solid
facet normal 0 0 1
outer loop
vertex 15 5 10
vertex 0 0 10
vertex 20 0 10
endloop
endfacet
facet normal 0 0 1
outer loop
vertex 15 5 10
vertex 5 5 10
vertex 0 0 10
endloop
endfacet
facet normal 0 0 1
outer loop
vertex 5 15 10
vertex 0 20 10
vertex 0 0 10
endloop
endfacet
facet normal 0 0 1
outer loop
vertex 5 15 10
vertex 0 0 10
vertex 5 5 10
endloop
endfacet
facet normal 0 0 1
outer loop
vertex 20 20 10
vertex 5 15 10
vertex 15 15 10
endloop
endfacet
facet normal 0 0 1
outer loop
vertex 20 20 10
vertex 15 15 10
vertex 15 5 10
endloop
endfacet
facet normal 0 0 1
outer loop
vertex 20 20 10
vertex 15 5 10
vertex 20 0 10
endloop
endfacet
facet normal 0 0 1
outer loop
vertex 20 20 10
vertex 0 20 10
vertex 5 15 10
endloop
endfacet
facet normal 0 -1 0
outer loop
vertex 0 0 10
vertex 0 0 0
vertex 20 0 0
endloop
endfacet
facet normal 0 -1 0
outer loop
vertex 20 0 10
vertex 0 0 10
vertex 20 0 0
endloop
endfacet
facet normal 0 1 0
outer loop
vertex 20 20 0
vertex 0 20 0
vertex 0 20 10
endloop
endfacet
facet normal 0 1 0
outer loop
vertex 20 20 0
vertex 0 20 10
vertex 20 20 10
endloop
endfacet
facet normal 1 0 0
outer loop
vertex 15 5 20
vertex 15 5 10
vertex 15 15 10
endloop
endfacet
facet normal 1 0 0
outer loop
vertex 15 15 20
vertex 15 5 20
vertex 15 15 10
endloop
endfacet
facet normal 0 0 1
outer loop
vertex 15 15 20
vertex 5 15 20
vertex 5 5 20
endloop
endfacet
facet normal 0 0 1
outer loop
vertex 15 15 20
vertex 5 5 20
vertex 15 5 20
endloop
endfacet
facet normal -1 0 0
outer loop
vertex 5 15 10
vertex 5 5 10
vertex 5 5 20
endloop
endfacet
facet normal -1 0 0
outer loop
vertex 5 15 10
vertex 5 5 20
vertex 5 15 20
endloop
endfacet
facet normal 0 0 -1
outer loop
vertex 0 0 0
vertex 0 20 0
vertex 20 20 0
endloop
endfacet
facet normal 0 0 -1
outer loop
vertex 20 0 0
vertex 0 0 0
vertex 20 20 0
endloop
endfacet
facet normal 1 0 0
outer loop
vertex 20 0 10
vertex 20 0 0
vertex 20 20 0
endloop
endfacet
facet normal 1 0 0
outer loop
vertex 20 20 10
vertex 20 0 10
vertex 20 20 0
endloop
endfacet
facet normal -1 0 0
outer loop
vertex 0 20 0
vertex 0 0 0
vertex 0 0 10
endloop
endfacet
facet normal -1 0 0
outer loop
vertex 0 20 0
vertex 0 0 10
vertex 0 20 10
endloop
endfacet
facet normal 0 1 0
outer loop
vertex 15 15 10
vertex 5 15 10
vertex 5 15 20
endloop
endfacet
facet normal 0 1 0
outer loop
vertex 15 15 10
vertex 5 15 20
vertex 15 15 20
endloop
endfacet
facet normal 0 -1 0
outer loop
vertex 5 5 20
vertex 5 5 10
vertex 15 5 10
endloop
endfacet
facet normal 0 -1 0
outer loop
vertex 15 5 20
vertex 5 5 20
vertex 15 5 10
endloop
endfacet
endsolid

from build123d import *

# Parameters (mm, degrees)
SKETCH_1_W                = 20
SKETCH_1_H                = 20
BASEBOX_DEPTH             = 10
SKETCH_2_W                = 10
SKETCH_2_H                = 10
DRAFTDIR2_DEPTH           = 10
DRAFTDIR2_OTHER_WAY_DEPTH = 5
DRAFTDIR2_OTHER_WAY_TAPER = 3


with BuildPart() as part:
    # 草图1 → BaseBox (new body)
    with BuildSketch(Plane.XY):
        with Locations((10, 10)):
            Rectangle(SKETCH_1_W, SKETCH_1_H)
    extrude(amount=BASEBOX_DEPTH)

    # 草图2 → DraftDir2 (add)
    with BuildSketch(Plane.XY.offset(10)):
        with Locations((10, 10)):
            Rectangle(SKETCH_2_W, SKETCH_2_H)
    extrude(amount=DRAFTDIR2_DEPTH)

    # 草图2 → DraftDir2 other way (add)
    with BuildSketch(Plane.XY.offset(10)):
        with Locations((10, 10)):
            Rectangle(SKETCH_2_W, SKETCH_2_H)
    extrude(amount=-DRAFTDIR2_OTHER_WAY_DEPTH, taper=DRAFTDIR2_OTHER_WAY_TAPER)


solid = part.part
